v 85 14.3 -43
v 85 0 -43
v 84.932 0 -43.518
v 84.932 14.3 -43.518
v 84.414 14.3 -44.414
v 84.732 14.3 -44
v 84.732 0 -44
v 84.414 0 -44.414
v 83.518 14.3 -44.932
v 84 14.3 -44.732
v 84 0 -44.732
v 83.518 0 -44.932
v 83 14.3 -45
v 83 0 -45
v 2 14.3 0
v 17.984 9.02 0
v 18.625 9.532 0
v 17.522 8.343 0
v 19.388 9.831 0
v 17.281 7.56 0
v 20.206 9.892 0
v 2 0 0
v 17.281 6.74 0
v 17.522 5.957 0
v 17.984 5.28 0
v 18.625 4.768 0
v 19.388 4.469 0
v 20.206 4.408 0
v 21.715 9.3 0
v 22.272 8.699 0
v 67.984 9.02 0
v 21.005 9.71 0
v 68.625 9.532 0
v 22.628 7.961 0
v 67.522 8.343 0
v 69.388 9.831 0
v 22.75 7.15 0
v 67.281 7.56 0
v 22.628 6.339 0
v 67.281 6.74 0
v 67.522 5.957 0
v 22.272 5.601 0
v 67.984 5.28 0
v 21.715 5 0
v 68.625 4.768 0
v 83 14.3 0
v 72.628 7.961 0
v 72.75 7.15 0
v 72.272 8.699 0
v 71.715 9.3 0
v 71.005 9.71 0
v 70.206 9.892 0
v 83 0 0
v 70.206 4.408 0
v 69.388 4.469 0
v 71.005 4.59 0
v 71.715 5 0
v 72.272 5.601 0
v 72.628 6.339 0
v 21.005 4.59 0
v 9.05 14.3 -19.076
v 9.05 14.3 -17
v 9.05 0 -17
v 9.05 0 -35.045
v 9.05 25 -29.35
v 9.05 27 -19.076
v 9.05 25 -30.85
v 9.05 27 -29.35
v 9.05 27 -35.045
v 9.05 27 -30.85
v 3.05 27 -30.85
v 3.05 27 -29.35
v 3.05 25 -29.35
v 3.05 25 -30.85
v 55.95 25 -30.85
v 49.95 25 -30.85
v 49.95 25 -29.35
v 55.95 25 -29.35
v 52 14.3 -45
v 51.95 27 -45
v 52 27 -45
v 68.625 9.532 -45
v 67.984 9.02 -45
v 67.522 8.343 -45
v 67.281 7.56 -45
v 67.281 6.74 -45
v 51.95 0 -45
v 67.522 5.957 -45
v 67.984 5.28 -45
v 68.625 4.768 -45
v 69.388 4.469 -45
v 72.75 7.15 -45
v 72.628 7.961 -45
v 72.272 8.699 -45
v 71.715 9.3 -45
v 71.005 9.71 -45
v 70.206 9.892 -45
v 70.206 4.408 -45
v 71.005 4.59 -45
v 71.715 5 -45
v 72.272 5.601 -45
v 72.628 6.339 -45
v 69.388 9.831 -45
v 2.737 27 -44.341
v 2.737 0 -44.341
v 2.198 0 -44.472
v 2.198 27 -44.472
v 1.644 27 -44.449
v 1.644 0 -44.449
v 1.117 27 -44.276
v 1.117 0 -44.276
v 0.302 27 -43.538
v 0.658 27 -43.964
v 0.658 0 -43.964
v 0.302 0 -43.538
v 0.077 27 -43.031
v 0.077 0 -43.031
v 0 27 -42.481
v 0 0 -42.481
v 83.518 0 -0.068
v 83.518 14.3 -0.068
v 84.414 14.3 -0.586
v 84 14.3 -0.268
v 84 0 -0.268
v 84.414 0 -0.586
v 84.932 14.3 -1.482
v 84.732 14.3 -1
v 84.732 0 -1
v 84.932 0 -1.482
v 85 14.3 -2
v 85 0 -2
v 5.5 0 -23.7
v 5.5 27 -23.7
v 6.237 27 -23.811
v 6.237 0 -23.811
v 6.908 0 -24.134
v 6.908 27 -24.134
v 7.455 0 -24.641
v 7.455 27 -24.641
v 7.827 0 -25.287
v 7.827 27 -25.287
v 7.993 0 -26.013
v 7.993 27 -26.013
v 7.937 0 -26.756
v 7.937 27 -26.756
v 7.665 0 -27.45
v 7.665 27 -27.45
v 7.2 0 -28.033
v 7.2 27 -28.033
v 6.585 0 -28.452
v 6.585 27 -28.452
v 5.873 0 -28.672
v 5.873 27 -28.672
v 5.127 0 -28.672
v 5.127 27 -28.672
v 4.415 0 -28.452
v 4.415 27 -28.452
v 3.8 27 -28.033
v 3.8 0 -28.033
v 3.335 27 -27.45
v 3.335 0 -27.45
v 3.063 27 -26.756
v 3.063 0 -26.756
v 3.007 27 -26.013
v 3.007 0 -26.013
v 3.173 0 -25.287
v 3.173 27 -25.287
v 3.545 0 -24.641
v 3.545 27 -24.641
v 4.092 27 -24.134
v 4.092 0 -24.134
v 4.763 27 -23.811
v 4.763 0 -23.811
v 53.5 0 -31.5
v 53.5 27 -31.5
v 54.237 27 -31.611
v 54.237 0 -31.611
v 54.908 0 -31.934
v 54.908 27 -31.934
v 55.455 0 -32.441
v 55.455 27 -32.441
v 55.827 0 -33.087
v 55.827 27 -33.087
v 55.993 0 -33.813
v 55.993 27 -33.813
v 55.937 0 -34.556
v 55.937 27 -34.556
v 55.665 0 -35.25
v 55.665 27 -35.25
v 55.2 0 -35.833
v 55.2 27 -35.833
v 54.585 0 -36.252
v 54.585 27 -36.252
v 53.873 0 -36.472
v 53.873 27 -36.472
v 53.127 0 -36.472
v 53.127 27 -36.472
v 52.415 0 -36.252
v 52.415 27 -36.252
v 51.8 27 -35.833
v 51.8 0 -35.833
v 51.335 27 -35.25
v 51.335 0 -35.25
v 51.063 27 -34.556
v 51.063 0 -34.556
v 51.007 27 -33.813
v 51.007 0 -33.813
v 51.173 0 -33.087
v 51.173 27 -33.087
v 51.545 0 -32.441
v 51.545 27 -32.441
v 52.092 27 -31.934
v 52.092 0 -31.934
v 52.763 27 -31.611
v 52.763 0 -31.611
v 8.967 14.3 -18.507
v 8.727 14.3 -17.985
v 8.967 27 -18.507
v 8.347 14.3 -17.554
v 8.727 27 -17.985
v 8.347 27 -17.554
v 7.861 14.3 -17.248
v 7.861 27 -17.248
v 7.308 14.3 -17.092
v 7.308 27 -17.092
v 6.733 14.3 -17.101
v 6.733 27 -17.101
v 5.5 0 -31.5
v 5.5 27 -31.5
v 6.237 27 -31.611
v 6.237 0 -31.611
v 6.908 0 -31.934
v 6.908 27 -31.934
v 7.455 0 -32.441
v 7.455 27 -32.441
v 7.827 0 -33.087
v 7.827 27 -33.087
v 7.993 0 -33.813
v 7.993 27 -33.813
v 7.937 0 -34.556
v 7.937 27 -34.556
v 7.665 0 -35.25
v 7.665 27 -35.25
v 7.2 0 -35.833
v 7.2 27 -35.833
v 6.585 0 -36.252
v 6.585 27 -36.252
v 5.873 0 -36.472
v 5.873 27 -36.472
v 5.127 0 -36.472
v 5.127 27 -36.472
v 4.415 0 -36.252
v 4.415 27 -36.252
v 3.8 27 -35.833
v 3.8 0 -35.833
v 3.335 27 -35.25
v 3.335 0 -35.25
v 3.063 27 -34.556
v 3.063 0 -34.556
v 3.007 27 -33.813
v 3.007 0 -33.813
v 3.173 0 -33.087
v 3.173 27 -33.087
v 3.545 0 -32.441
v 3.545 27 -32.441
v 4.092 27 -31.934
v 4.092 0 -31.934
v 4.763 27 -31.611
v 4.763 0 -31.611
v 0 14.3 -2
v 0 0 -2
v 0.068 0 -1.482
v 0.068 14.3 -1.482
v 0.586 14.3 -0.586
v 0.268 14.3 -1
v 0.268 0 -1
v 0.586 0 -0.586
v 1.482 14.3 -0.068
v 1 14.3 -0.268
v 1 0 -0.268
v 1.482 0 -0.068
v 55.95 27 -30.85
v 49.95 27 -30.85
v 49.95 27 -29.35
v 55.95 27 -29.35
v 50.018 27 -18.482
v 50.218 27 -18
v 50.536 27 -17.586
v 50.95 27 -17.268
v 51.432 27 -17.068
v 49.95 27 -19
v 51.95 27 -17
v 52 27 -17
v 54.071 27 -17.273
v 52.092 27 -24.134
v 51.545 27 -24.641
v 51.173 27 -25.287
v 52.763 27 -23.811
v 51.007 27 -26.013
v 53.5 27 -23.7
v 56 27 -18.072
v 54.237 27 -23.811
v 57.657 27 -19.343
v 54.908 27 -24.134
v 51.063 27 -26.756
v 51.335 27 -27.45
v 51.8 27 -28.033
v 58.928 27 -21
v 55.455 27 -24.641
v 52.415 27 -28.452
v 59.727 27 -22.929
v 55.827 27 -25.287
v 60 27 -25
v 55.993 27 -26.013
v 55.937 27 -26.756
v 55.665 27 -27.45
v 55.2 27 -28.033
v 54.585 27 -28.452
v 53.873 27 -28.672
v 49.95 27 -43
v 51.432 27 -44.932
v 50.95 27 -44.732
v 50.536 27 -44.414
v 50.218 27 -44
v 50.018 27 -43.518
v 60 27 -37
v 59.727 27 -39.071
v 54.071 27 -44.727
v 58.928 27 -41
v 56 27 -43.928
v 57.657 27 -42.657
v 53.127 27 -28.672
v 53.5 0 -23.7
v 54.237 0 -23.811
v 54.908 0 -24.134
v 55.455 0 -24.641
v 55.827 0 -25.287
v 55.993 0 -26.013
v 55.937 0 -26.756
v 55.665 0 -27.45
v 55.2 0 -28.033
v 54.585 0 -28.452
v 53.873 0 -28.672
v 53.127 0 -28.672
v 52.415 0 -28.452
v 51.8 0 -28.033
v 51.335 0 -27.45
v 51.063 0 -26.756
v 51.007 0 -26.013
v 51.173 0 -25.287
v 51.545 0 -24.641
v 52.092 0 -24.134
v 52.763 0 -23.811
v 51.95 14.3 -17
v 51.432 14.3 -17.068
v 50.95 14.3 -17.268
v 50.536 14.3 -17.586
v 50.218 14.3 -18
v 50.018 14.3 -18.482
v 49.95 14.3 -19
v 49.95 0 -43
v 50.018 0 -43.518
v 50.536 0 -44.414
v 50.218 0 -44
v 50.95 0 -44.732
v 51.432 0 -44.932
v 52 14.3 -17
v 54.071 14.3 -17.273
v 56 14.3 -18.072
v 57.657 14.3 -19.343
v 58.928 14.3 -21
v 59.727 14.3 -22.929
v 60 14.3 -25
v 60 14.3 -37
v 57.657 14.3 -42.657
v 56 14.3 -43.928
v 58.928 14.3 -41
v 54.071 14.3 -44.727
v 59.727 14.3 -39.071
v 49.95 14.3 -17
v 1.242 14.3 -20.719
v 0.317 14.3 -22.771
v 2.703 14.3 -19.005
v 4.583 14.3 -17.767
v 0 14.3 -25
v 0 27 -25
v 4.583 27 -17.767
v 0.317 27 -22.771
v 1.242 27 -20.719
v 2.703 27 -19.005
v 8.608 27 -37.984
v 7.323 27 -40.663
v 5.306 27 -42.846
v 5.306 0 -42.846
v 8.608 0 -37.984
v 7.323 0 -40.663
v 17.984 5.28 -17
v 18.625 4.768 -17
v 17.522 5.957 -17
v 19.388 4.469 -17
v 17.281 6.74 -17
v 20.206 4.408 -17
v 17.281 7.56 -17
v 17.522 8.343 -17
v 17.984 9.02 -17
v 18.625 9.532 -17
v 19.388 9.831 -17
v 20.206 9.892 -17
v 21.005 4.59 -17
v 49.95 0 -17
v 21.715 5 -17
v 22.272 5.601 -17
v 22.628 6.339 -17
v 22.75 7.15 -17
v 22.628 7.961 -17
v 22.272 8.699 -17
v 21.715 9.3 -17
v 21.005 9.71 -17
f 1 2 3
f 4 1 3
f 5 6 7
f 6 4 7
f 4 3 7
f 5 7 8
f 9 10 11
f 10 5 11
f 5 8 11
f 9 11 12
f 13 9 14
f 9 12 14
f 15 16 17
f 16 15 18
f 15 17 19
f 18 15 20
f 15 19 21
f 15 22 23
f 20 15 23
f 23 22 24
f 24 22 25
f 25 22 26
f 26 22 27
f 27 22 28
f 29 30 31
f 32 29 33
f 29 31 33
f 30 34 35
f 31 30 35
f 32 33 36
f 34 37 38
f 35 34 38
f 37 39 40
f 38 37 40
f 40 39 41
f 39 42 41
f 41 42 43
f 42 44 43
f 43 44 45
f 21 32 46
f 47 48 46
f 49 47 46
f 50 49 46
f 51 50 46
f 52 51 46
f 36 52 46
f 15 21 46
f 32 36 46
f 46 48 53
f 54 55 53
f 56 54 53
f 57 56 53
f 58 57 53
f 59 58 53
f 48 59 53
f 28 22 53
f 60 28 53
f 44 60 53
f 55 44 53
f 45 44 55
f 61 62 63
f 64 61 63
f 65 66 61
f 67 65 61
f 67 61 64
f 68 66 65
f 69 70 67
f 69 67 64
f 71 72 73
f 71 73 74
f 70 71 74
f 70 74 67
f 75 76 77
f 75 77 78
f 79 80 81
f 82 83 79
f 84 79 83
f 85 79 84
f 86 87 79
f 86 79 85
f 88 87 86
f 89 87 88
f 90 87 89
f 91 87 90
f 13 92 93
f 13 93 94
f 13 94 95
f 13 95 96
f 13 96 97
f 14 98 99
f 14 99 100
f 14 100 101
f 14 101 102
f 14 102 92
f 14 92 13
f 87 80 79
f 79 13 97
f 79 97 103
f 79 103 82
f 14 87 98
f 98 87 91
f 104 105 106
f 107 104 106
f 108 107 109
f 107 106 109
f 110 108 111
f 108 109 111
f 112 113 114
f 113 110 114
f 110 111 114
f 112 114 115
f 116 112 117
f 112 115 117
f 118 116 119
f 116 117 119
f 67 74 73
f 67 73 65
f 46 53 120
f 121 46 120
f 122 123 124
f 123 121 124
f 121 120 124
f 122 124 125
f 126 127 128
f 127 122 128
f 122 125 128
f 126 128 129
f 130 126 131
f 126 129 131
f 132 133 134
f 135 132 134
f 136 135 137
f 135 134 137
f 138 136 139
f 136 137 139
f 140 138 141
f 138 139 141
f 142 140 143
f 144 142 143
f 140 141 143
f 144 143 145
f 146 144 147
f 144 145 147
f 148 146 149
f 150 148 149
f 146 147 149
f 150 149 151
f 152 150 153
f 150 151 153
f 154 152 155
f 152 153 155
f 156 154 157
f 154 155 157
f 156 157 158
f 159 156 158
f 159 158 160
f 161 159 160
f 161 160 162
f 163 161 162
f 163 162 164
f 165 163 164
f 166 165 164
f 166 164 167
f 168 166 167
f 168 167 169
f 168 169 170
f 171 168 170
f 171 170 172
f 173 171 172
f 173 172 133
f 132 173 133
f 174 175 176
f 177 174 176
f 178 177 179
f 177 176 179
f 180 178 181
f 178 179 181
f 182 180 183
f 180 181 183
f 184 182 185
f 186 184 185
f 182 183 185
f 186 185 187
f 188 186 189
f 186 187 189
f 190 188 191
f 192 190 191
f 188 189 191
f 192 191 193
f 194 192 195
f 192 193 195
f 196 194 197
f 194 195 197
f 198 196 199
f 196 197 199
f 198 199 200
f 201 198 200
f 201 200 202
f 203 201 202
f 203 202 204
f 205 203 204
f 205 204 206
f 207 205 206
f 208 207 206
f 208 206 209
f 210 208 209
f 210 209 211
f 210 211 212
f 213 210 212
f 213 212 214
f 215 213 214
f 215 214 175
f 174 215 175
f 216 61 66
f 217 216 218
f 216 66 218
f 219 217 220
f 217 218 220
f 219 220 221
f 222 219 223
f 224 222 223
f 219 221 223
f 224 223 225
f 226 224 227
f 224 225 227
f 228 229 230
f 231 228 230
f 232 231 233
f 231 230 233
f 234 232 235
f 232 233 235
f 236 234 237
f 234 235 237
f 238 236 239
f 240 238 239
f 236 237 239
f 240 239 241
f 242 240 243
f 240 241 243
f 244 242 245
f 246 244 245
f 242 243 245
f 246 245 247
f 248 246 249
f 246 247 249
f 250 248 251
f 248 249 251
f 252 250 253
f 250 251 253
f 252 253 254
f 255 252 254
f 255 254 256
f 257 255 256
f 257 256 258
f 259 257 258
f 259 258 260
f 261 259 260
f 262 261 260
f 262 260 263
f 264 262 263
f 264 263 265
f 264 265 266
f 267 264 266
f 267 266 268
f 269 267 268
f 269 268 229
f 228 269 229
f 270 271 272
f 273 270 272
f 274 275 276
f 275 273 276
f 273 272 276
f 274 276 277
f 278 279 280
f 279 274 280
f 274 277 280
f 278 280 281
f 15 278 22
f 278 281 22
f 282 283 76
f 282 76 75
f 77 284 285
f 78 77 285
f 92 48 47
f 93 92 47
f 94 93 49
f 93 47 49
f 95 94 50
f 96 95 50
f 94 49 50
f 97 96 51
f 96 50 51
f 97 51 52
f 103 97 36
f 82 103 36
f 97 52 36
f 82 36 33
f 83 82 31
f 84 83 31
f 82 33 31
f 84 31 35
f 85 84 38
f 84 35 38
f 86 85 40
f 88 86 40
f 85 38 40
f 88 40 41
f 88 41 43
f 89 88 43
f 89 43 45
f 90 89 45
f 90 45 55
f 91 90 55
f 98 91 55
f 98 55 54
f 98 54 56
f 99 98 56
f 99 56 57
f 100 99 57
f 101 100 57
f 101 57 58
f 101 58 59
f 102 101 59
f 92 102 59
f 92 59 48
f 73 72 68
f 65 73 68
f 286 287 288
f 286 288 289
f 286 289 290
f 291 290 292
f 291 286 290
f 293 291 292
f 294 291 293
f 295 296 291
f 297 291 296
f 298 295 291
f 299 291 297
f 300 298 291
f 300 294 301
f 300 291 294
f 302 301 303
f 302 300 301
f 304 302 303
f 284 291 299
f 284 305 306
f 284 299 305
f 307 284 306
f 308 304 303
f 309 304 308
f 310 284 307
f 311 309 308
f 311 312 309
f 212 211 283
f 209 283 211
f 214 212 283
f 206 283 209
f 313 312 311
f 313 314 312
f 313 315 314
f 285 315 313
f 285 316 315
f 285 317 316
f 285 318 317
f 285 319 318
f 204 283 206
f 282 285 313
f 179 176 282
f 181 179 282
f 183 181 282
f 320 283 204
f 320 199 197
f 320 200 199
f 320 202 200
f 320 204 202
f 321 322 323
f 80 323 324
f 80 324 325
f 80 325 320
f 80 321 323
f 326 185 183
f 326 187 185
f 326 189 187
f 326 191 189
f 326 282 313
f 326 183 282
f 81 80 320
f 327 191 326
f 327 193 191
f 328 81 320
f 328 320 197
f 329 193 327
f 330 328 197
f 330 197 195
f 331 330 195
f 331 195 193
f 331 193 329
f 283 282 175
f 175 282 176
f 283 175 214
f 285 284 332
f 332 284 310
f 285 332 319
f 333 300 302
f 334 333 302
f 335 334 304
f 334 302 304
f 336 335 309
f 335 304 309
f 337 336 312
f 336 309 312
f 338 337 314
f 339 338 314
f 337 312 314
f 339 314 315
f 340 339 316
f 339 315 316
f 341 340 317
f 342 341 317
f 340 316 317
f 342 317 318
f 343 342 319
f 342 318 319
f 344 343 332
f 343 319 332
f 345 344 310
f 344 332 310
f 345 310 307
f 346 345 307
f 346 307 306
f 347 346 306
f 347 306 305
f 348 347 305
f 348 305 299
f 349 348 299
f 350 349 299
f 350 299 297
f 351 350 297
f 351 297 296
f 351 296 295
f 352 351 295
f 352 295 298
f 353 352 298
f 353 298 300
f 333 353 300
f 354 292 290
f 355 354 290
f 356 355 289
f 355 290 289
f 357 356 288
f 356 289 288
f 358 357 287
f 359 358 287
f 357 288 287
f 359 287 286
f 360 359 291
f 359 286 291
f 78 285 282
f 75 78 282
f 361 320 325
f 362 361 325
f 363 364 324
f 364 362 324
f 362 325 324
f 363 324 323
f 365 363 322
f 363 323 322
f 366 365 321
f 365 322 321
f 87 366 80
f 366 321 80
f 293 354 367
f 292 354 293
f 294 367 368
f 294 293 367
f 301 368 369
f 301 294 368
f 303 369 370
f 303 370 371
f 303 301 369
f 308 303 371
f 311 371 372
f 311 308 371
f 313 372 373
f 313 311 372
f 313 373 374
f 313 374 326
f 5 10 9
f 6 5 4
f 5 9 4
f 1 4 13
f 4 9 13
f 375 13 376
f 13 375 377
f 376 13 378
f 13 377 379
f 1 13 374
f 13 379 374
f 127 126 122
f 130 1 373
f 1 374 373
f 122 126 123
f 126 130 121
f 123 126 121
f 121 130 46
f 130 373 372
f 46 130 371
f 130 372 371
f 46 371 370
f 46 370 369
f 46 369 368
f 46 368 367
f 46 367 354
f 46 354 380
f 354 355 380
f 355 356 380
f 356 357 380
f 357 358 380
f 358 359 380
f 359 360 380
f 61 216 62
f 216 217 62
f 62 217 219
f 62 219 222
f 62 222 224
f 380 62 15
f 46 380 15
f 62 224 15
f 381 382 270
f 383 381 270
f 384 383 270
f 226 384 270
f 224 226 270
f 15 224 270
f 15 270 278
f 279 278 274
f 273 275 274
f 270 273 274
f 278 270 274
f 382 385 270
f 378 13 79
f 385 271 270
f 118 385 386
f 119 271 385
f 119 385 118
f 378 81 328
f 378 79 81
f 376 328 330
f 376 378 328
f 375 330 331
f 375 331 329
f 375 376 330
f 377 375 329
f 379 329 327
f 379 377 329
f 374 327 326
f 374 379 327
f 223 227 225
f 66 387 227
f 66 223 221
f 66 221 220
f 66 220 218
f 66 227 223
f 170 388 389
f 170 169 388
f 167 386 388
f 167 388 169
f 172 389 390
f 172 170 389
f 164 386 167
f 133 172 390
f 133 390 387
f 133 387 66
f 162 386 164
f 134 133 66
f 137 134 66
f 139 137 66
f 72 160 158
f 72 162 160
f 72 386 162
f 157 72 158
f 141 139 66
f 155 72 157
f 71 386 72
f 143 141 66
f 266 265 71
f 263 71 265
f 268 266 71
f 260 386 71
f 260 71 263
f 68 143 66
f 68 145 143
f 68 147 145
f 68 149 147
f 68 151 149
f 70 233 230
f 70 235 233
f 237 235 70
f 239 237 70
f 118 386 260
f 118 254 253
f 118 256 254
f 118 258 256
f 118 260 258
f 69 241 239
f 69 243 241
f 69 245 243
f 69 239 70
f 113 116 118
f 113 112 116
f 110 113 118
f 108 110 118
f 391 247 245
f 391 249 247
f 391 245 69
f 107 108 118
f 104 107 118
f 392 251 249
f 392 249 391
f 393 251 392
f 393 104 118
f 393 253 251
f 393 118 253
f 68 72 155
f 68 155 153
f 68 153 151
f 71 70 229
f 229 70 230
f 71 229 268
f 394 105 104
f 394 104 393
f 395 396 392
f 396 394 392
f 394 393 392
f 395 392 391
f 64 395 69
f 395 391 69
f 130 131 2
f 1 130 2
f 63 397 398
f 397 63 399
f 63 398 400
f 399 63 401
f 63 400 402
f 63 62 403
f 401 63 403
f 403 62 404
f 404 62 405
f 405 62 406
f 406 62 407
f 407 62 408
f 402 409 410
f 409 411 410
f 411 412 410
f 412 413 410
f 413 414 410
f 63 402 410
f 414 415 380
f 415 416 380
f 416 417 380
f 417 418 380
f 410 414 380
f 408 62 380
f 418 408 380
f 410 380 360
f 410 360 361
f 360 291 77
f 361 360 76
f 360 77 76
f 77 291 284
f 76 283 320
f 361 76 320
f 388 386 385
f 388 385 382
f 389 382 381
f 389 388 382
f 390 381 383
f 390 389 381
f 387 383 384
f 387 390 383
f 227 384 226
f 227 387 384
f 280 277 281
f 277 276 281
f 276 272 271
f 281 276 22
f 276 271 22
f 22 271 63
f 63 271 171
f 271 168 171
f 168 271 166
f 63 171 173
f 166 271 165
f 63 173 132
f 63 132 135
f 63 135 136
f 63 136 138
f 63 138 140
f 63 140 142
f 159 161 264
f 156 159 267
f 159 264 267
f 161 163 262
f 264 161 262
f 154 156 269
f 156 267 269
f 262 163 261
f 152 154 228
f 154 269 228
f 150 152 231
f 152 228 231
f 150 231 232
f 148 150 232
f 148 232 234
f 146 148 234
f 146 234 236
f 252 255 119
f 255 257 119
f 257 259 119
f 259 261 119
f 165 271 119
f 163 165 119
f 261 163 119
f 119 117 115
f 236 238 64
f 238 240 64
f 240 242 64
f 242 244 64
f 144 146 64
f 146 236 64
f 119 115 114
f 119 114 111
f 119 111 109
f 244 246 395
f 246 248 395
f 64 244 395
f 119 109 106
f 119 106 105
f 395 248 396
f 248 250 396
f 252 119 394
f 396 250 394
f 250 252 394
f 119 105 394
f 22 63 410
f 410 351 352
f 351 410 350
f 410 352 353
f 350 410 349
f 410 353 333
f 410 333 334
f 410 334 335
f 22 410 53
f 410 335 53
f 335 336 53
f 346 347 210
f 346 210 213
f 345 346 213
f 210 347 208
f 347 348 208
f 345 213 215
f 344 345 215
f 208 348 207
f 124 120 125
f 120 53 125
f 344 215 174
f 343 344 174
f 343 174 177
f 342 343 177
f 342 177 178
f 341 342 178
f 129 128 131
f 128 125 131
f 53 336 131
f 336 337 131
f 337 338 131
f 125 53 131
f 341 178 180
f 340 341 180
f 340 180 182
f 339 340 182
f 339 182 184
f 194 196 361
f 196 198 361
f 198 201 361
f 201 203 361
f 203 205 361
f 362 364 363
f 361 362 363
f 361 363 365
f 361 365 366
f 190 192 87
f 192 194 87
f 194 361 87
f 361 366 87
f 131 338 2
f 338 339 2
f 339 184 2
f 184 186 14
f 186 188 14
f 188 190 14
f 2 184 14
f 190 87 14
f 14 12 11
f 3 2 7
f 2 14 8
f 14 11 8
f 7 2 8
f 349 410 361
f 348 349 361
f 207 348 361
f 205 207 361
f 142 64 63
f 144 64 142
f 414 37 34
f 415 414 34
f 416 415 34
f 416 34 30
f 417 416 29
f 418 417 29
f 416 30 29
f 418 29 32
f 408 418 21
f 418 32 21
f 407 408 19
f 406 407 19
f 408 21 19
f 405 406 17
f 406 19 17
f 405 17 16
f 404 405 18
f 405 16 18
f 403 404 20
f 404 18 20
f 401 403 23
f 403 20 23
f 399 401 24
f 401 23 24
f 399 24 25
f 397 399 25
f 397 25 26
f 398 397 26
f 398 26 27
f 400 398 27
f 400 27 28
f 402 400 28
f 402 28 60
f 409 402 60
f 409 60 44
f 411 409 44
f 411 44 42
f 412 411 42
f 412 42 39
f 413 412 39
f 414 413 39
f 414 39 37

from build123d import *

# Parameters (mm, degrees)
SKETCH1_W           = 85
SKETCH1_H           = 45
BOSS_EXTRUDE1_DEPTH = 27
SKETCH2_R           = 2.5
CUT_EXTRUDE1_DEPTH  = 100.894944817
SKETCH4_W           = 17
SKETCH4_H           = 12.7
CUT_EXTRUDE2_DEPTH  = 100.894944817
SKETCH5_W           = 25
SKETCH5_H           = 12.7
CUT_EXTRUDE3_DEPTH  = 94.477269964
SKETCH6_W           = 40.9
SKETCH6_H           = 28
CUT_EXTRUDE4_DEPTH  = 100.894944817
FILLET1_R           = 10
FILLET2_R           = 8
FILLET4_R           = 2
SKETCH7_R           = 2.75
CUT_EXTRUDE5_DEPTH  = 100.894944817
SKETCH8_W           = 6
SKETCH8_H           = 1.5
CUT_EXTRUDE6_DEPTH  = 2


with BuildPart() as part:
    # Sketch1 → Boss-Extrude1 (new body)
    with BuildSketch(Plane(origin=(0, 0, 0), x_dir=(1, 0, 0), z_dir=(0, 1, 0))):
        with Locations((42.5, 22.5)):
            Rectangle(SKETCH1_W, SKETCH1_H)
    extrude(amount=BOSS_EXTRUDE1_DEPTH)

    # Sketch2 → Cut-Extrude1 (cut, through all)
    with BuildSketch(Plane(origin=(0, 27, 0), x_dir=(1, 0, 0), z_dir=(0, 1, 0))):
        with Locations(Location((5.5, 34, 0), (0, 0, 270))):
            Circle(SKETCH2_R)
        with Locations(Location((53.5, 34, 0), (0, 0, 270))):
            Circle(SKETCH2_R)
        with Locations(Location((53.5, 26.2, 0), (0, 0, 270))):
            Circle(SKETCH2_R)
        with Locations(Location((5.5, 26.2, 0), (0, 0, 270))):
            Circle(SKETCH2_R)
    extrude(amount=-CUT_EXTRUDE1_DEPTH, mode=Mode.SUBTRACT)

    # Sketch4 → Cut-Extrude2 (cut, through all)
    with BuildSketch(Plane.ZY):
        with Locations((-8.5, 20.65)):
            Rectangle(SKETCH4_W, SKETCH4_H)
    extrude(amount=-CUT_EXTRUDE2_DEPTH, mode=Mode.SUBTRACT)

    # Sketch5 → Cut-Extrude3 (cut, through all)
    with BuildSketch(Plane.XY.offset(-17)):
        with Locations((72.5, 20.65)):
            Rectangle(SKETCH5_W, SKETCH5_H)
    extrude(amount=-CUT_EXTRUDE3_DEPTH, mode=Mode.SUBTRACT)

    # Sketch6 → Cut-Extrude4 (cut, through all)
    with BuildSketch(Plane(origin=(0, 27, 0), x_dir=(1, 0, 0), z_dir=(0, 1, 0))):
        with Locations((29.5, 31)):
            Rectangle(SKETCH6_W, SKETCH6_H)
    extrude(amount=-CUT_EXTRUDE4_DEPTH, mode=Mode.SUBTRACT)

    # Fillet1
    # the kernel refuses this fillet: 10 mm, written as the material it takes off along each edge
    with BuildSketch(Plane(origin=(9.05, 51.886931812, -45), x_dir=(-1, 0, 0), z_dir=(0, -1, 0))) as fillet1_piece_1:
        with BuildLine():
            CenterArc((10, -9.954772725), FILLET1_R, 95.451319812, 84.548680188)
            Line((0, -9.954772725), (-0.2, -9.954772725))
            Line((-0.2, -9.954772725), (-0.2, 0))
            Line((-0.2, 0), (0, 0.2))
            ThreePointArc((0, 0.2), (4.525, 0.2), (9.031, 0.199095454))
            Line((9.031, 0.199095454), (9.05, 0))
        make_face()
    extrude(amount=76.773863623, mode=Mode.SUBTRACT)

    # Fillet2
    fillet2_edges = [part.edges().sort_by_distance(p)[0] for p in [
        (0, 20.65, -17),
        (60, 20.65, -45),
        (60, 20.65, -17),
    ]]
    fillet(fillet2_edges, radius=FILLET2_R)

    # Fillet4
    # the kernel refuses this fillet: 2 mm, written as the material it takes off along each edge
    with BuildSketch(Plane(origin=(9.05, 32.797158858, -17), x_dir=(0, 0, -1), z_dir=(0, -1, 0))) as fillet4_piece_1:
        with BuildLine():
            CenterArc((2.075685694, -2), FILLET4_R, 90, 99.110170153)
            Line((0.100914258, -2.316666667), (-0.096562885, -2.348333333))
            ThreePointArc((-0.096562885, -2.348333333), (-0.2, -1.05), (-0.2, 0))
            Line((-0.2, 0), (0, 0.2))
            Line((0, 0.2), (2.075685694, 0.2))
            Line((2.075685694, 0.2), (2.075685694, 0))
        make_face()
    extrude(amount=18.497158858, mode=Mode.SUBTRACT)
    with BuildSketch(Plane(origin=(49.95, 32, -17), x_dir=(0, 0, -1), z_dir=(0, -1, 0))) as fillet4_piece_2:
        with BuildLine():
            CenterArc((FILLET4_R, FILLET4_R), FILLET4_R, 180, 90)
            Line((0, FILLET4_R), (0, 0))
            Line((0, 0), (FILLET4_R, 0))
        make_face()
    extrude(amount=17.7, mode=Mode.SUBTRACT)
    with BuildSketch(Plane(origin=(49.95, 32, -45), x_dir=(0, 0, 1), z_dir=(0, -1, 0))) as fillet4_piece_3:
        with BuildLine():
            CenterArc((FILLET4_R, -FILLET4_R), FILLET4_R, 90, 90)
            Line((0, -FILLET4_R), (0, 0))
            Line((0, 0), (FILLET4_R, 0))
        make_face()
    extrude(amount=37, mode=Mode.SUBTRACT)
    with BuildSketch(Plane(origin=(85, -5, -45), x_dir=(0, 0, 1), z_dir=(0, 1, 0)), Plane(origin=(85, -5, 0), x_dir=(-1, 0, 0), z_dir=(0, 1, 0)), Plane(origin=(0, -5, 0), x_dir=(0, 0, -1), z_dir=(0, 1, 0))) as fillet4_piece_4:
        with BuildLine():
            CenterArc((FILLET4_R, -FILLET4_R), FILLET4_R, 90, 90)
            Line((0, -FILLET4_R), (0, 0))
            Line((0, 0), (FILLET4_R, 0))
        make_face()
    extrude(amount=24.3, mode=Mode.SUBTRACT)
    with BuildSketch(Plane(origin=(0, -7.039544043, -45), x_dir=(0.972186544788057, 0, 0.23420786095487744), z_dir=(0, 1, 0))) as fillet4_piece_5:
        with BuildLine():
            CenterArc((2.534235855, -1.980078713), FILLET4_R, 81.906386313, 111.638547186)
            Line((0.589862766, -2.448494435), (0, 0))
            ThreePointArc((0, 0), (1.407908809, 0.099606433), (2.815817617, 0))
        make_face()
    extrude(amount=41.079088086, mode=Mode.SUBTRACT)

    # Sketch7 → Cut-Extrude5 (cut, through all)
    with BuildSketch(Plane.XY):
        with Locations((70, 7.15)):
            Circle(SKETCH7_R)
        with Locations((20, 7.15)):
            Circle(SKETCH7_R)
    extrude(amount=-CUT_EXTRUDE5_DEPTH, mode=Mode.SUBTRACT)

    # Sketch8 → Cut-Extrude6 (cut)
    with BuildSketch(Plane(origin=(0, 27, 0), x_dir=(1, 0, 0), z_dir=(0, 1, 0))):
        with Locations((6.05, 30.1)):
            Rectangle(SKETCH8_W, SKETCH8_H)
        with Locations((52.95, 30.1)):
            Rectangle(SKETCH8_W, SKETCH8_H)
    extrude(amount=-CUT_EXTRUDE6_DEPTH, mode=Mode.SUBTRACT)


solid = part.part
